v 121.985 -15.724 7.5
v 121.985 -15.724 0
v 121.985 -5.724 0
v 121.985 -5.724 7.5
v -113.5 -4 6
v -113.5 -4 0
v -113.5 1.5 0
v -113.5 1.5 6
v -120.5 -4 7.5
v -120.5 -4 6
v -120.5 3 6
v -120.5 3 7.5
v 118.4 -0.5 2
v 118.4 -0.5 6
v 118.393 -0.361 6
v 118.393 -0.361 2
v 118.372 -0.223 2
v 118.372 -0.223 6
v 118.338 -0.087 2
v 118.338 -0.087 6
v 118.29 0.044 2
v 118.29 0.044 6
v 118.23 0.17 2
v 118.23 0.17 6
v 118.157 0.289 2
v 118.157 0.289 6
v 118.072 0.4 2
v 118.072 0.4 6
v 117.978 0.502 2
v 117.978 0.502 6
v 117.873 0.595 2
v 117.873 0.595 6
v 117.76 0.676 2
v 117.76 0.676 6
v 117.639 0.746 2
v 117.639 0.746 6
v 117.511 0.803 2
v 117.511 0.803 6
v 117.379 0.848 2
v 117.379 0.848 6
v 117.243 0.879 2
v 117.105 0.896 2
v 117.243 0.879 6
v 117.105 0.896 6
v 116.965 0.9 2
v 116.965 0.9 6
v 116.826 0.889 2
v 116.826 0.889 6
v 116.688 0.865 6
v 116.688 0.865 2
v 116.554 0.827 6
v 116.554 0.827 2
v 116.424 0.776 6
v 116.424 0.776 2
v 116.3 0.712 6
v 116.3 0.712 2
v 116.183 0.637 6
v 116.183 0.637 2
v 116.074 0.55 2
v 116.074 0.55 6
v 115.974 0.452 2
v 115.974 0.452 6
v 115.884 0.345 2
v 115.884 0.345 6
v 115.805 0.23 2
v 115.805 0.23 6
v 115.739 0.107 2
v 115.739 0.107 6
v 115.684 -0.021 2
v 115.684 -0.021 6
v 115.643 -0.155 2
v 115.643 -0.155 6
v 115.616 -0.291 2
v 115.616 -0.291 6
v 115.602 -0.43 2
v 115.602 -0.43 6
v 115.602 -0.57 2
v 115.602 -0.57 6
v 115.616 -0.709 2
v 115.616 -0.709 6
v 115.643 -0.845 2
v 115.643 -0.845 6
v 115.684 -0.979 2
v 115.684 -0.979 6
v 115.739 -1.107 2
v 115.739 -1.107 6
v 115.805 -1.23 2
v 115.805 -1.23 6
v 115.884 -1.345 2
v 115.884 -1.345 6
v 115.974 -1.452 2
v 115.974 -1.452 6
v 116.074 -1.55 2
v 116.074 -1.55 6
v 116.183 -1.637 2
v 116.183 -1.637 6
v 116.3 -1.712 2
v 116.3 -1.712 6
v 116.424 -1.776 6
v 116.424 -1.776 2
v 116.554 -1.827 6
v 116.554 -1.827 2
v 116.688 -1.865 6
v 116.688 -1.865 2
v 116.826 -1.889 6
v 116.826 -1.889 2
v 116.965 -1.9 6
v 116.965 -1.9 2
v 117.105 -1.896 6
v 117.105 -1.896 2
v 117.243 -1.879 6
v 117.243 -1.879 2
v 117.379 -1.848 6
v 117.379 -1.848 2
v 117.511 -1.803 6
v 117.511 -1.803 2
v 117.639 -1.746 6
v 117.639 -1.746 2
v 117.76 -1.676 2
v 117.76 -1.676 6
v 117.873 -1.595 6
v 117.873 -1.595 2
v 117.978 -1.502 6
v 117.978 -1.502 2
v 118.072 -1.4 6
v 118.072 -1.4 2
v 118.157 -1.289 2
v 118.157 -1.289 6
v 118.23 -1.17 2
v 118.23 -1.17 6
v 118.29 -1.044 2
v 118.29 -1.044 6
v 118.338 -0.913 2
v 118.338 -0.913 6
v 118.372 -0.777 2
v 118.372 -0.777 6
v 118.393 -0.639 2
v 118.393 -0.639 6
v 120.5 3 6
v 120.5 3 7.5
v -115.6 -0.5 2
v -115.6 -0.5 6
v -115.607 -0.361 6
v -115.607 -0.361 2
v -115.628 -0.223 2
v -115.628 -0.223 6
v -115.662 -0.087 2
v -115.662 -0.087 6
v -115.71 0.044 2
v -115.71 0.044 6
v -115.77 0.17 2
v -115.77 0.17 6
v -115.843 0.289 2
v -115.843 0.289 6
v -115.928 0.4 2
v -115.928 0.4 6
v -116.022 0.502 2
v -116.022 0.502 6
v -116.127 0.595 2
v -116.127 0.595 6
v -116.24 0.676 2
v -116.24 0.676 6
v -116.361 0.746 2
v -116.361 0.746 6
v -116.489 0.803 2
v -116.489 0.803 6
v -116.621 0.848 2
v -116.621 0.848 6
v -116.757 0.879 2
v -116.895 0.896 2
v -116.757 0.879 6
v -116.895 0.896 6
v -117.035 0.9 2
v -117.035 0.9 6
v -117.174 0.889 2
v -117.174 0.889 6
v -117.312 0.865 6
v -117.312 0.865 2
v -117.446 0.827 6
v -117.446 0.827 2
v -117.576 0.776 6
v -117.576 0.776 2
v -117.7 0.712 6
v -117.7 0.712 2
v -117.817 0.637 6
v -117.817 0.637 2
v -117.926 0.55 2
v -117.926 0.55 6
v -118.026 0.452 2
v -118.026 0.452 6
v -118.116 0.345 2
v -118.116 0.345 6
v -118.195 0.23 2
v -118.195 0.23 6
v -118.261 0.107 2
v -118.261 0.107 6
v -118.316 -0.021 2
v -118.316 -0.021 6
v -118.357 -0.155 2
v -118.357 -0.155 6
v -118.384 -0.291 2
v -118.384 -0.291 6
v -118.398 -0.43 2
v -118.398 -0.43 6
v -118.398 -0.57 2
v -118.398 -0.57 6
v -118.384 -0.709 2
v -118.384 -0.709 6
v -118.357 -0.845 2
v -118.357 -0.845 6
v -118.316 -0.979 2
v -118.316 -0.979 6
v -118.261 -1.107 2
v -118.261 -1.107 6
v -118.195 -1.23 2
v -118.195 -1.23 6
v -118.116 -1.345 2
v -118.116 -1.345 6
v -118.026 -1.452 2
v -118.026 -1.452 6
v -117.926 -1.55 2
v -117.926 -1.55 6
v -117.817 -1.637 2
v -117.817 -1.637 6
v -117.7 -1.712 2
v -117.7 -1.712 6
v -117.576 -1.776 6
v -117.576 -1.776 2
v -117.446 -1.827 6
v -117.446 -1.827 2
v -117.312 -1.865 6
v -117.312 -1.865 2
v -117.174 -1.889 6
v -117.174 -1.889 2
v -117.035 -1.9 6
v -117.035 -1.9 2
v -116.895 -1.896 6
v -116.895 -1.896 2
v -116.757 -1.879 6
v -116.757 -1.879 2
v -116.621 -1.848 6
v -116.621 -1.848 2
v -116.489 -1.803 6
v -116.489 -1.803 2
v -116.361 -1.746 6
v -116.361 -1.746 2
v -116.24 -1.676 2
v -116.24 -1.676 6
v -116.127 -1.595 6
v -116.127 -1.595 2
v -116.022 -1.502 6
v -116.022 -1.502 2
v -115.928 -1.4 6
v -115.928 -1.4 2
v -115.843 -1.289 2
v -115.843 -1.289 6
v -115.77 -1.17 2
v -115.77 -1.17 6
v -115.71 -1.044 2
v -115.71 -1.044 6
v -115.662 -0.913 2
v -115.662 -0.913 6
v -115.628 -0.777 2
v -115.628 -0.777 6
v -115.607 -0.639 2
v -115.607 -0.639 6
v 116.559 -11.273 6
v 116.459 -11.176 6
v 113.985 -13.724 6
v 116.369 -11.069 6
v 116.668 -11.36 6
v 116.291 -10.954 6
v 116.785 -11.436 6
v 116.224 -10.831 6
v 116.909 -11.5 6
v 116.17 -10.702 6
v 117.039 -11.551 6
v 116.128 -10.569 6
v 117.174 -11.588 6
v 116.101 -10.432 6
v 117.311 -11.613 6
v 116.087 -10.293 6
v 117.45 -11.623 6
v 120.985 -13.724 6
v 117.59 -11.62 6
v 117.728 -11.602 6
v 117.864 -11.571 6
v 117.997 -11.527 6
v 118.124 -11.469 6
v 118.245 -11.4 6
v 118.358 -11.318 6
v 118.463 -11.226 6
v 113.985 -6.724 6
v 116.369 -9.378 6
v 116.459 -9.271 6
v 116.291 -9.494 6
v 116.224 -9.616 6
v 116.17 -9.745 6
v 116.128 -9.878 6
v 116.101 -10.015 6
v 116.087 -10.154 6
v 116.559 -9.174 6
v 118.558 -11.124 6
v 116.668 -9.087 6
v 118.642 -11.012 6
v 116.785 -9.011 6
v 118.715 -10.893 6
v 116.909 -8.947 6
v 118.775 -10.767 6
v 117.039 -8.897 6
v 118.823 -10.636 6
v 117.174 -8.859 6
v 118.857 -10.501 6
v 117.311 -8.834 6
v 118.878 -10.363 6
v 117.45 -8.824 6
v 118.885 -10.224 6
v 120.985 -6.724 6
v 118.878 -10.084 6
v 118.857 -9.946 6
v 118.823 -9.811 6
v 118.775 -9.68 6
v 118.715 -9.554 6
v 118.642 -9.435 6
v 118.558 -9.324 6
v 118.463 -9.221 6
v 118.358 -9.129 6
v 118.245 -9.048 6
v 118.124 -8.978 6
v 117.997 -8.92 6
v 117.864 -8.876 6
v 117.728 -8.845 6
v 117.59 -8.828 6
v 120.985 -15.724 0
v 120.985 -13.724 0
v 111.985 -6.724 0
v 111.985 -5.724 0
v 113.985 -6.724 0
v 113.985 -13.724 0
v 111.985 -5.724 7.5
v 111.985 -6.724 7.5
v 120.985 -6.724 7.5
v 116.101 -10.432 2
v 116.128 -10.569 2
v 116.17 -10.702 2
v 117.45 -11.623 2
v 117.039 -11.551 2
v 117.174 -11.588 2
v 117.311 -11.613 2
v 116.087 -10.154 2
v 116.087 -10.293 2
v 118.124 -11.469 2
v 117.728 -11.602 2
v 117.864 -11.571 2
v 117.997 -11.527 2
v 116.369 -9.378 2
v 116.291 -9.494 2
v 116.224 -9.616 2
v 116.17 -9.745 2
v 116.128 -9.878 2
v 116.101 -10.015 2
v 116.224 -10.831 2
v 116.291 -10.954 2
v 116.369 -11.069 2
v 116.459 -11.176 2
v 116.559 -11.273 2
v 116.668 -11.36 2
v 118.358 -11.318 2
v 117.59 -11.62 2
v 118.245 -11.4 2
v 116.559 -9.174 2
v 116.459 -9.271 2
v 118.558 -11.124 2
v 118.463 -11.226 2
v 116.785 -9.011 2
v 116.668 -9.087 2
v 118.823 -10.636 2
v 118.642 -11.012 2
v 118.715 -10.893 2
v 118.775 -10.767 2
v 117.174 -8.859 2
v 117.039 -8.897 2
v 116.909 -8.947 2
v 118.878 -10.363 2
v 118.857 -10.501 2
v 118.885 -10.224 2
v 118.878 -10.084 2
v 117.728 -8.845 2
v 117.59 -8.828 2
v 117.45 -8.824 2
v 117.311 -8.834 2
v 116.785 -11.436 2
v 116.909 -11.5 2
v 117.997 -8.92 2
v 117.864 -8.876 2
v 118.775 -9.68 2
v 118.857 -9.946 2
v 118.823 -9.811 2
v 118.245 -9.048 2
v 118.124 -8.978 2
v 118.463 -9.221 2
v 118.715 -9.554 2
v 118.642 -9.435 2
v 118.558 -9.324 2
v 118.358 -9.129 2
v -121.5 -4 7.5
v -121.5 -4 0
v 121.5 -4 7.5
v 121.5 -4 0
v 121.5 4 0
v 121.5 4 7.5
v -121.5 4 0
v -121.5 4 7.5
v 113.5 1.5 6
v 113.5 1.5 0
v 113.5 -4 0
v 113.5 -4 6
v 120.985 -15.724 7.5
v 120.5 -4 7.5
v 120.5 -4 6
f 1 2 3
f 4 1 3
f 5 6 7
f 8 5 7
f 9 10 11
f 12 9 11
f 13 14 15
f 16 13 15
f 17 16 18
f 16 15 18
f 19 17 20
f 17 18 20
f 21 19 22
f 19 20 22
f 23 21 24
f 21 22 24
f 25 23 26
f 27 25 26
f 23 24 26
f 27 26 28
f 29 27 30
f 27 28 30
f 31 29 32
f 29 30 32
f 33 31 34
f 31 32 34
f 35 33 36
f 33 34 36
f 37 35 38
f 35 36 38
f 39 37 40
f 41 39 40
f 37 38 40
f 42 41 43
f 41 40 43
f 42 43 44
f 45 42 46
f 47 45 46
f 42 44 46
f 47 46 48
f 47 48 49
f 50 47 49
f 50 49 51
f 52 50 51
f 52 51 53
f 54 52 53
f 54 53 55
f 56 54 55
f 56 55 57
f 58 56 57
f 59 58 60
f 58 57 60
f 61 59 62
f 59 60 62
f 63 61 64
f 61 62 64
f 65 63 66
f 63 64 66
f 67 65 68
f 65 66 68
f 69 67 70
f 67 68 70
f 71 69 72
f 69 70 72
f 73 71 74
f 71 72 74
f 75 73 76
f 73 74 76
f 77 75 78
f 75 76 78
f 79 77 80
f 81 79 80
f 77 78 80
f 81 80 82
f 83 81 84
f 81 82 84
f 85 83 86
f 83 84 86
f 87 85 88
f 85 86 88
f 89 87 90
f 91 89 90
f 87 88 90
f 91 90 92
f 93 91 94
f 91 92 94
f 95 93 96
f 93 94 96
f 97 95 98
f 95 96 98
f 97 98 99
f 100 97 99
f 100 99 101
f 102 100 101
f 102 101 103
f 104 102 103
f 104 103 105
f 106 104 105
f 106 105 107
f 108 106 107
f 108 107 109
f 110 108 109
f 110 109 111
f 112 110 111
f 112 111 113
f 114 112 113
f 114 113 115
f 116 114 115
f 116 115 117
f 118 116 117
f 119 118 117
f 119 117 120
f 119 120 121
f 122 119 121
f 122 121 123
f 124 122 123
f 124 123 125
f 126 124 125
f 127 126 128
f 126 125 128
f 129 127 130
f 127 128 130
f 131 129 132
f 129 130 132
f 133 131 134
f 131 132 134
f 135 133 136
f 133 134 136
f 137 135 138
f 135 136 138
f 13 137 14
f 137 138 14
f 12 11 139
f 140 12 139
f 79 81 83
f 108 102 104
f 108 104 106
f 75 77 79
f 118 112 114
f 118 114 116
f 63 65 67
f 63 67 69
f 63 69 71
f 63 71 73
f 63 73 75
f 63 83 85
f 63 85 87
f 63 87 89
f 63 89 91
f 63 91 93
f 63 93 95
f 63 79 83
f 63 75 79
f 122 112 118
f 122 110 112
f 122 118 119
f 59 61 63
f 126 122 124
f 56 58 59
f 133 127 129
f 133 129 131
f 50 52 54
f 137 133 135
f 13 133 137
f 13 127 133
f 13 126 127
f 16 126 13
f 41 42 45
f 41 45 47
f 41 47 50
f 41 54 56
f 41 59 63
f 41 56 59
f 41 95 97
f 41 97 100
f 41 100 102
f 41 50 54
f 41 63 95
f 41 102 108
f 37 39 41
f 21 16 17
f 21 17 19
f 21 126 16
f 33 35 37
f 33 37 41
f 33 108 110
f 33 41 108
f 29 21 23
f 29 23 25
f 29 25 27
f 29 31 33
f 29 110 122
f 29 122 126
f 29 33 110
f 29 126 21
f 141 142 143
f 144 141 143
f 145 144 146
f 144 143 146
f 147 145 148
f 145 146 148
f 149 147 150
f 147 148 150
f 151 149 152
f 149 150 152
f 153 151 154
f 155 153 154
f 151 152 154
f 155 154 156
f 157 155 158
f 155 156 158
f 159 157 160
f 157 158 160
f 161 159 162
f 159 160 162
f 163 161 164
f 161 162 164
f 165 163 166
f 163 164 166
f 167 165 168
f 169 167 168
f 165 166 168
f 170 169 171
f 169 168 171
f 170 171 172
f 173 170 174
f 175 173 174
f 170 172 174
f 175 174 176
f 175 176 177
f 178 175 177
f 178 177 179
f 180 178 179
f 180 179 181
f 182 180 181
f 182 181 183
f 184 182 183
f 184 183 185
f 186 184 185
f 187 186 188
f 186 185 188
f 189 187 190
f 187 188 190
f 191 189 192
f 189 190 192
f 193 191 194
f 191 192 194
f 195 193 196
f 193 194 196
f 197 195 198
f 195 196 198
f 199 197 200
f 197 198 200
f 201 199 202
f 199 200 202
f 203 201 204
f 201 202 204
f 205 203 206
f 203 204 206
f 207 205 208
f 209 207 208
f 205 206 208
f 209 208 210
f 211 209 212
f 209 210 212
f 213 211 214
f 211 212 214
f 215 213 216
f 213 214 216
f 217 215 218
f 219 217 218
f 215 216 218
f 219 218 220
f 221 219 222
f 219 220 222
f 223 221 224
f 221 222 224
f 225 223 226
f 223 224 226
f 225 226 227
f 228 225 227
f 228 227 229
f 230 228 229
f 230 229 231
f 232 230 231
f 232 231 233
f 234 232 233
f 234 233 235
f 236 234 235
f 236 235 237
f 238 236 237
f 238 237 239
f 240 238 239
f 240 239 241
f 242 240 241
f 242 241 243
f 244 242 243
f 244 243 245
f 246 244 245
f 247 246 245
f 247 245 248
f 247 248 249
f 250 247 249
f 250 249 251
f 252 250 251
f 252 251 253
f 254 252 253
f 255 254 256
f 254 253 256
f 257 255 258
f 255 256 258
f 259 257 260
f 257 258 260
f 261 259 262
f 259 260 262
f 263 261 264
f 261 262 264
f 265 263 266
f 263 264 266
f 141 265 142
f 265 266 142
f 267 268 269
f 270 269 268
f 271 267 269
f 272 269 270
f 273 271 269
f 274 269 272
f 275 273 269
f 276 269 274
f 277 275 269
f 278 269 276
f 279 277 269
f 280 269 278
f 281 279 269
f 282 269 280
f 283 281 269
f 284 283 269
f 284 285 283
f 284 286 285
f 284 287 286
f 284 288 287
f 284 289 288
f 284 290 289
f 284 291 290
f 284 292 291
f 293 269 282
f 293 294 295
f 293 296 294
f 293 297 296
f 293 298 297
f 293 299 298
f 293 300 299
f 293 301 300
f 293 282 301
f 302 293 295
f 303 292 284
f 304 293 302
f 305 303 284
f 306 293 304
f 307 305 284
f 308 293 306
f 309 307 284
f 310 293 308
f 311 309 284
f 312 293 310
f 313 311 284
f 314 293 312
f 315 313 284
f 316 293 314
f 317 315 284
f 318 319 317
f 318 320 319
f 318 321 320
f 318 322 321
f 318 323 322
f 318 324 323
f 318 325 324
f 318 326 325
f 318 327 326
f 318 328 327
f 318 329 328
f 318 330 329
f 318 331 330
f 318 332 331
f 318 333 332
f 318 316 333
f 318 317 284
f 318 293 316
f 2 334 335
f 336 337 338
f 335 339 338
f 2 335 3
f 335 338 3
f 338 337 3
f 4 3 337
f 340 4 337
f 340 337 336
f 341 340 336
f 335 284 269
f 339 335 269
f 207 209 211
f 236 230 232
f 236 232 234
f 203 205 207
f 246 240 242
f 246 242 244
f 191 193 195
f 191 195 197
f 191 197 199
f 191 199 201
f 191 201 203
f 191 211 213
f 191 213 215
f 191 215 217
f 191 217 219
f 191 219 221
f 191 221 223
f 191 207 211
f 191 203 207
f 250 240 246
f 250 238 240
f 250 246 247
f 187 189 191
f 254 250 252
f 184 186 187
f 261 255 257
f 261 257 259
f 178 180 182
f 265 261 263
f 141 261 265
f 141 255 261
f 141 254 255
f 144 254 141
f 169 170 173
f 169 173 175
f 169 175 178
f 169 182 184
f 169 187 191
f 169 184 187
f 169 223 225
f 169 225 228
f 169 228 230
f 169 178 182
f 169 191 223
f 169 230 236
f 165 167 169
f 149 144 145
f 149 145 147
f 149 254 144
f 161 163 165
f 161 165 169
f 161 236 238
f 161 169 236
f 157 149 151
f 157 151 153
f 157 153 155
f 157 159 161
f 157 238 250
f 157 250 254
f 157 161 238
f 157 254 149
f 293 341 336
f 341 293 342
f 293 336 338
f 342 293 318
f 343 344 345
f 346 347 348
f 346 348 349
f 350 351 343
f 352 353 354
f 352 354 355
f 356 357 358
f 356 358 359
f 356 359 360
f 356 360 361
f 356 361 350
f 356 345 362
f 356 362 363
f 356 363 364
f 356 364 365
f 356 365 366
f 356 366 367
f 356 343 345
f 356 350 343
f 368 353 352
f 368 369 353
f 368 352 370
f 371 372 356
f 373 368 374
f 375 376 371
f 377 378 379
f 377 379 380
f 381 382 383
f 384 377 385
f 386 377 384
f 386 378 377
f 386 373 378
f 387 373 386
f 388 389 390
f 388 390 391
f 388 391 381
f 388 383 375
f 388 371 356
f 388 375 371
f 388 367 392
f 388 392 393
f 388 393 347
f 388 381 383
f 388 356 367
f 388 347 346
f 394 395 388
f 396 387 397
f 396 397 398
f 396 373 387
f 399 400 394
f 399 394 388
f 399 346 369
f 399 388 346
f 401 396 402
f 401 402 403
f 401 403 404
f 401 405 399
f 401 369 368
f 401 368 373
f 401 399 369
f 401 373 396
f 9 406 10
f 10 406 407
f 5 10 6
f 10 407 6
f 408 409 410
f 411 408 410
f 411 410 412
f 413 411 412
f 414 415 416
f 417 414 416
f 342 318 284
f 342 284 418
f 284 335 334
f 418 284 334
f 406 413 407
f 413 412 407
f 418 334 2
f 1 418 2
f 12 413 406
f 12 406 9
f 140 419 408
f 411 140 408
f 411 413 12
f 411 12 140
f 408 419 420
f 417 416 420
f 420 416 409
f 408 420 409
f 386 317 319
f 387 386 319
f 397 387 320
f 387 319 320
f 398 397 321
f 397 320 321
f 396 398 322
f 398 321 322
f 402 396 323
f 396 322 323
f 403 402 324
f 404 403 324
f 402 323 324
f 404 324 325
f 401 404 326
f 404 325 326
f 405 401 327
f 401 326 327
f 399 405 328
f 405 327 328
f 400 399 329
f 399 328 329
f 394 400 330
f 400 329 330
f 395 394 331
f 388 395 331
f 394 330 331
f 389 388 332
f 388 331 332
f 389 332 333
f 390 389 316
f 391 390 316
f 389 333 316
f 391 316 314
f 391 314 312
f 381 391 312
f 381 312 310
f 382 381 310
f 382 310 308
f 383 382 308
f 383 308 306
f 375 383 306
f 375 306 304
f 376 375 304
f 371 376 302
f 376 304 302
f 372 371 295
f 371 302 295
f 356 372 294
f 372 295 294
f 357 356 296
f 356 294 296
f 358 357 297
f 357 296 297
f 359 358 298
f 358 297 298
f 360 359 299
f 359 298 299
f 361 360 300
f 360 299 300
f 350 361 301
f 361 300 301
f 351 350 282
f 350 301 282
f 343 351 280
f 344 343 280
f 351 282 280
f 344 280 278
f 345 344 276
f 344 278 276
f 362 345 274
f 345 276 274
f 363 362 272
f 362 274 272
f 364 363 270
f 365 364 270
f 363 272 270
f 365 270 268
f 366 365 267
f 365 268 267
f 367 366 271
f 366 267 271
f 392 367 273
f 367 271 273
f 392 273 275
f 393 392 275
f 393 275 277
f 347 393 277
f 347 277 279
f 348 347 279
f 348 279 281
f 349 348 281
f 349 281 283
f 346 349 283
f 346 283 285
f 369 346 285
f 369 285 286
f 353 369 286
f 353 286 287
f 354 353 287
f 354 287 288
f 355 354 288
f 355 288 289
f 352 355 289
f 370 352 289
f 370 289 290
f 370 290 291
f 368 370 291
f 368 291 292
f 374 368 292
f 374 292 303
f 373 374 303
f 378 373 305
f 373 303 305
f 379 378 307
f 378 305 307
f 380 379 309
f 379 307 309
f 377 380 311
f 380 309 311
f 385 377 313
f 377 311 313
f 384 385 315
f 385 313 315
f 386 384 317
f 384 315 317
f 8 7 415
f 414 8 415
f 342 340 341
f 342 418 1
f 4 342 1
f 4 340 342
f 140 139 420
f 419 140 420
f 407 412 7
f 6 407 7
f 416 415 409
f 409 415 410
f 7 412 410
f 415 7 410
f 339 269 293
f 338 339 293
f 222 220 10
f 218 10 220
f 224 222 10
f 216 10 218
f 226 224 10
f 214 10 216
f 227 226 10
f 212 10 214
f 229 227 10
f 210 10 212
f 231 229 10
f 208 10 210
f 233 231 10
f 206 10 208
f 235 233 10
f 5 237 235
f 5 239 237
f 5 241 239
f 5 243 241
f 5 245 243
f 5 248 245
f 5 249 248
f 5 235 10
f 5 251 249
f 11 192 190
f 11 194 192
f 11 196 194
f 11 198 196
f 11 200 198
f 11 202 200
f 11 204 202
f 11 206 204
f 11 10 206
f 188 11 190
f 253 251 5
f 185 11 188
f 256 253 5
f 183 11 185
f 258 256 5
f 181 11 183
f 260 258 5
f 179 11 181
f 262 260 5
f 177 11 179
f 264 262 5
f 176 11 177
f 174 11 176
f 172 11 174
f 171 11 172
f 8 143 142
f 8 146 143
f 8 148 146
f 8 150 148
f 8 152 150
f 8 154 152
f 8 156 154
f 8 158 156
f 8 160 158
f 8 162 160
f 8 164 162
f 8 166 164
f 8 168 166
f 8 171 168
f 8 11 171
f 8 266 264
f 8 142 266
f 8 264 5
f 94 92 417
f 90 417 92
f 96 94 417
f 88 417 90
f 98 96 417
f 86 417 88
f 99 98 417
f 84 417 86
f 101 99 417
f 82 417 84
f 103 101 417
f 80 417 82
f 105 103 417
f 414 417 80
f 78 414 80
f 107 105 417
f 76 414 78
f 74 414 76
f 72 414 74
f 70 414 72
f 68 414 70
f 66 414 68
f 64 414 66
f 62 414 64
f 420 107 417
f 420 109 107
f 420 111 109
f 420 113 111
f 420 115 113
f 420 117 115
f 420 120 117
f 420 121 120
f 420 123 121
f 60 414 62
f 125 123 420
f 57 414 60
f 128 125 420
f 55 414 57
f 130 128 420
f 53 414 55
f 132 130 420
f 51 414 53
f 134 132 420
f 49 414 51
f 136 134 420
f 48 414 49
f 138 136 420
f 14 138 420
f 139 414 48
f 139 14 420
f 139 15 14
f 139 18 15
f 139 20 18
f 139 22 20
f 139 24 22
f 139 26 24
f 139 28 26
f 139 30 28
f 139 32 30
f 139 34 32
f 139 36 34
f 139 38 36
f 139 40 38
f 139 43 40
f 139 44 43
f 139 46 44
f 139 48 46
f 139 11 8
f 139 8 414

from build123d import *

# Parameters (mm, degrees)
F1_DEPTH  = 6
F2_R      = 1.4
F3_DEPTH  = 4
F5_DEPTH  = 1.5
F6_W      = 10
F6_H      = 10
F7_DEPTH  = 6
F8_R      = 1.4
F9_DEPTH  = 4
F11_DEPTH = 1.5
F13_DEPTH = 25


with BuildPart() as f1:
    # F0 (on Top) → F1 (new body)
    with BuildSketch(Plane.XY):
        Polygon((113.5, -4), (121.5, -4), (121.5, 4), (-121.5, 4), (-121.5, -4), (-113.5, -4), (-113.5, 1.5), (113.5, 1.5), align=None)
    extrude(amount=F1_DEPTH)

    # F2 (on face) → F3 (cut)
    with BuildSketch(Plane.XY.offset(6)):
        with Locations((-117, -0.5)):
            Circle(F2_R)
        with Locations((117, -0.5)):
            Circle(F2_R)
    extrude(amount=-F3_DEPTH, mode=Mode.SUBTRACT)

    # F4 (on face) → F5 (join)
    with BuildSketch(Plane.XY.offset(6)):
        Polygon((121.5, 4), (-121.5, 4), (-121.5, -4), (-120.5, -4), (-120.5, 3), (120.5, 3), (120.5, -4), (121.5, -4), align=None)
    extrude(amount=F5_DEPTH)


with BuildPart() as f7:
    # F6 (on Top) → F7 (new body)
    with BuildSketch(Plane.XY):
        with Locations((116.985112, -10.723599)):
            Rectangle(F6_W, F6_H)
    extrude(amount=F7_DEPTH)

    # F8 (on face) → F9 (cut)
    with BuildSketch(Plane.XY.offset(6)):
        with Locations((117.485112, -10.223599)):
            Circle(F8_R)
    extrude(amount=-F9_DEPTH, mode=Mode.SUBTRACT)

    # F10 (on face) → F11 (join)
    with BuildSketch(Plane.XY.offset(6)):
        Polygon((121.985112, -5.723599), (111.985112, -5.723599), (111.985112, -6.723599), (120.985112, -6.723599), (120.985112, -15.723599), (121.985112, -15.723599), align=None)
    extrude(amount=F11_DEPTH)

    # F12 (on face) → F13 (cut)
    with BuildSketch(Plane.XY.offset(6)):
        Polygon((113.985112, -6.723599), (111.985112, -6.723599), (111.985112, -15.723599), (120.985112, -15.723599), (120.985112, -13.723599), (113.985112, -13.723599), align=None)
    extrude(amount=-F13_DEPTH, mode=Mode.SUBTRACT)


solid = Compound([f1.part, f7.part])
